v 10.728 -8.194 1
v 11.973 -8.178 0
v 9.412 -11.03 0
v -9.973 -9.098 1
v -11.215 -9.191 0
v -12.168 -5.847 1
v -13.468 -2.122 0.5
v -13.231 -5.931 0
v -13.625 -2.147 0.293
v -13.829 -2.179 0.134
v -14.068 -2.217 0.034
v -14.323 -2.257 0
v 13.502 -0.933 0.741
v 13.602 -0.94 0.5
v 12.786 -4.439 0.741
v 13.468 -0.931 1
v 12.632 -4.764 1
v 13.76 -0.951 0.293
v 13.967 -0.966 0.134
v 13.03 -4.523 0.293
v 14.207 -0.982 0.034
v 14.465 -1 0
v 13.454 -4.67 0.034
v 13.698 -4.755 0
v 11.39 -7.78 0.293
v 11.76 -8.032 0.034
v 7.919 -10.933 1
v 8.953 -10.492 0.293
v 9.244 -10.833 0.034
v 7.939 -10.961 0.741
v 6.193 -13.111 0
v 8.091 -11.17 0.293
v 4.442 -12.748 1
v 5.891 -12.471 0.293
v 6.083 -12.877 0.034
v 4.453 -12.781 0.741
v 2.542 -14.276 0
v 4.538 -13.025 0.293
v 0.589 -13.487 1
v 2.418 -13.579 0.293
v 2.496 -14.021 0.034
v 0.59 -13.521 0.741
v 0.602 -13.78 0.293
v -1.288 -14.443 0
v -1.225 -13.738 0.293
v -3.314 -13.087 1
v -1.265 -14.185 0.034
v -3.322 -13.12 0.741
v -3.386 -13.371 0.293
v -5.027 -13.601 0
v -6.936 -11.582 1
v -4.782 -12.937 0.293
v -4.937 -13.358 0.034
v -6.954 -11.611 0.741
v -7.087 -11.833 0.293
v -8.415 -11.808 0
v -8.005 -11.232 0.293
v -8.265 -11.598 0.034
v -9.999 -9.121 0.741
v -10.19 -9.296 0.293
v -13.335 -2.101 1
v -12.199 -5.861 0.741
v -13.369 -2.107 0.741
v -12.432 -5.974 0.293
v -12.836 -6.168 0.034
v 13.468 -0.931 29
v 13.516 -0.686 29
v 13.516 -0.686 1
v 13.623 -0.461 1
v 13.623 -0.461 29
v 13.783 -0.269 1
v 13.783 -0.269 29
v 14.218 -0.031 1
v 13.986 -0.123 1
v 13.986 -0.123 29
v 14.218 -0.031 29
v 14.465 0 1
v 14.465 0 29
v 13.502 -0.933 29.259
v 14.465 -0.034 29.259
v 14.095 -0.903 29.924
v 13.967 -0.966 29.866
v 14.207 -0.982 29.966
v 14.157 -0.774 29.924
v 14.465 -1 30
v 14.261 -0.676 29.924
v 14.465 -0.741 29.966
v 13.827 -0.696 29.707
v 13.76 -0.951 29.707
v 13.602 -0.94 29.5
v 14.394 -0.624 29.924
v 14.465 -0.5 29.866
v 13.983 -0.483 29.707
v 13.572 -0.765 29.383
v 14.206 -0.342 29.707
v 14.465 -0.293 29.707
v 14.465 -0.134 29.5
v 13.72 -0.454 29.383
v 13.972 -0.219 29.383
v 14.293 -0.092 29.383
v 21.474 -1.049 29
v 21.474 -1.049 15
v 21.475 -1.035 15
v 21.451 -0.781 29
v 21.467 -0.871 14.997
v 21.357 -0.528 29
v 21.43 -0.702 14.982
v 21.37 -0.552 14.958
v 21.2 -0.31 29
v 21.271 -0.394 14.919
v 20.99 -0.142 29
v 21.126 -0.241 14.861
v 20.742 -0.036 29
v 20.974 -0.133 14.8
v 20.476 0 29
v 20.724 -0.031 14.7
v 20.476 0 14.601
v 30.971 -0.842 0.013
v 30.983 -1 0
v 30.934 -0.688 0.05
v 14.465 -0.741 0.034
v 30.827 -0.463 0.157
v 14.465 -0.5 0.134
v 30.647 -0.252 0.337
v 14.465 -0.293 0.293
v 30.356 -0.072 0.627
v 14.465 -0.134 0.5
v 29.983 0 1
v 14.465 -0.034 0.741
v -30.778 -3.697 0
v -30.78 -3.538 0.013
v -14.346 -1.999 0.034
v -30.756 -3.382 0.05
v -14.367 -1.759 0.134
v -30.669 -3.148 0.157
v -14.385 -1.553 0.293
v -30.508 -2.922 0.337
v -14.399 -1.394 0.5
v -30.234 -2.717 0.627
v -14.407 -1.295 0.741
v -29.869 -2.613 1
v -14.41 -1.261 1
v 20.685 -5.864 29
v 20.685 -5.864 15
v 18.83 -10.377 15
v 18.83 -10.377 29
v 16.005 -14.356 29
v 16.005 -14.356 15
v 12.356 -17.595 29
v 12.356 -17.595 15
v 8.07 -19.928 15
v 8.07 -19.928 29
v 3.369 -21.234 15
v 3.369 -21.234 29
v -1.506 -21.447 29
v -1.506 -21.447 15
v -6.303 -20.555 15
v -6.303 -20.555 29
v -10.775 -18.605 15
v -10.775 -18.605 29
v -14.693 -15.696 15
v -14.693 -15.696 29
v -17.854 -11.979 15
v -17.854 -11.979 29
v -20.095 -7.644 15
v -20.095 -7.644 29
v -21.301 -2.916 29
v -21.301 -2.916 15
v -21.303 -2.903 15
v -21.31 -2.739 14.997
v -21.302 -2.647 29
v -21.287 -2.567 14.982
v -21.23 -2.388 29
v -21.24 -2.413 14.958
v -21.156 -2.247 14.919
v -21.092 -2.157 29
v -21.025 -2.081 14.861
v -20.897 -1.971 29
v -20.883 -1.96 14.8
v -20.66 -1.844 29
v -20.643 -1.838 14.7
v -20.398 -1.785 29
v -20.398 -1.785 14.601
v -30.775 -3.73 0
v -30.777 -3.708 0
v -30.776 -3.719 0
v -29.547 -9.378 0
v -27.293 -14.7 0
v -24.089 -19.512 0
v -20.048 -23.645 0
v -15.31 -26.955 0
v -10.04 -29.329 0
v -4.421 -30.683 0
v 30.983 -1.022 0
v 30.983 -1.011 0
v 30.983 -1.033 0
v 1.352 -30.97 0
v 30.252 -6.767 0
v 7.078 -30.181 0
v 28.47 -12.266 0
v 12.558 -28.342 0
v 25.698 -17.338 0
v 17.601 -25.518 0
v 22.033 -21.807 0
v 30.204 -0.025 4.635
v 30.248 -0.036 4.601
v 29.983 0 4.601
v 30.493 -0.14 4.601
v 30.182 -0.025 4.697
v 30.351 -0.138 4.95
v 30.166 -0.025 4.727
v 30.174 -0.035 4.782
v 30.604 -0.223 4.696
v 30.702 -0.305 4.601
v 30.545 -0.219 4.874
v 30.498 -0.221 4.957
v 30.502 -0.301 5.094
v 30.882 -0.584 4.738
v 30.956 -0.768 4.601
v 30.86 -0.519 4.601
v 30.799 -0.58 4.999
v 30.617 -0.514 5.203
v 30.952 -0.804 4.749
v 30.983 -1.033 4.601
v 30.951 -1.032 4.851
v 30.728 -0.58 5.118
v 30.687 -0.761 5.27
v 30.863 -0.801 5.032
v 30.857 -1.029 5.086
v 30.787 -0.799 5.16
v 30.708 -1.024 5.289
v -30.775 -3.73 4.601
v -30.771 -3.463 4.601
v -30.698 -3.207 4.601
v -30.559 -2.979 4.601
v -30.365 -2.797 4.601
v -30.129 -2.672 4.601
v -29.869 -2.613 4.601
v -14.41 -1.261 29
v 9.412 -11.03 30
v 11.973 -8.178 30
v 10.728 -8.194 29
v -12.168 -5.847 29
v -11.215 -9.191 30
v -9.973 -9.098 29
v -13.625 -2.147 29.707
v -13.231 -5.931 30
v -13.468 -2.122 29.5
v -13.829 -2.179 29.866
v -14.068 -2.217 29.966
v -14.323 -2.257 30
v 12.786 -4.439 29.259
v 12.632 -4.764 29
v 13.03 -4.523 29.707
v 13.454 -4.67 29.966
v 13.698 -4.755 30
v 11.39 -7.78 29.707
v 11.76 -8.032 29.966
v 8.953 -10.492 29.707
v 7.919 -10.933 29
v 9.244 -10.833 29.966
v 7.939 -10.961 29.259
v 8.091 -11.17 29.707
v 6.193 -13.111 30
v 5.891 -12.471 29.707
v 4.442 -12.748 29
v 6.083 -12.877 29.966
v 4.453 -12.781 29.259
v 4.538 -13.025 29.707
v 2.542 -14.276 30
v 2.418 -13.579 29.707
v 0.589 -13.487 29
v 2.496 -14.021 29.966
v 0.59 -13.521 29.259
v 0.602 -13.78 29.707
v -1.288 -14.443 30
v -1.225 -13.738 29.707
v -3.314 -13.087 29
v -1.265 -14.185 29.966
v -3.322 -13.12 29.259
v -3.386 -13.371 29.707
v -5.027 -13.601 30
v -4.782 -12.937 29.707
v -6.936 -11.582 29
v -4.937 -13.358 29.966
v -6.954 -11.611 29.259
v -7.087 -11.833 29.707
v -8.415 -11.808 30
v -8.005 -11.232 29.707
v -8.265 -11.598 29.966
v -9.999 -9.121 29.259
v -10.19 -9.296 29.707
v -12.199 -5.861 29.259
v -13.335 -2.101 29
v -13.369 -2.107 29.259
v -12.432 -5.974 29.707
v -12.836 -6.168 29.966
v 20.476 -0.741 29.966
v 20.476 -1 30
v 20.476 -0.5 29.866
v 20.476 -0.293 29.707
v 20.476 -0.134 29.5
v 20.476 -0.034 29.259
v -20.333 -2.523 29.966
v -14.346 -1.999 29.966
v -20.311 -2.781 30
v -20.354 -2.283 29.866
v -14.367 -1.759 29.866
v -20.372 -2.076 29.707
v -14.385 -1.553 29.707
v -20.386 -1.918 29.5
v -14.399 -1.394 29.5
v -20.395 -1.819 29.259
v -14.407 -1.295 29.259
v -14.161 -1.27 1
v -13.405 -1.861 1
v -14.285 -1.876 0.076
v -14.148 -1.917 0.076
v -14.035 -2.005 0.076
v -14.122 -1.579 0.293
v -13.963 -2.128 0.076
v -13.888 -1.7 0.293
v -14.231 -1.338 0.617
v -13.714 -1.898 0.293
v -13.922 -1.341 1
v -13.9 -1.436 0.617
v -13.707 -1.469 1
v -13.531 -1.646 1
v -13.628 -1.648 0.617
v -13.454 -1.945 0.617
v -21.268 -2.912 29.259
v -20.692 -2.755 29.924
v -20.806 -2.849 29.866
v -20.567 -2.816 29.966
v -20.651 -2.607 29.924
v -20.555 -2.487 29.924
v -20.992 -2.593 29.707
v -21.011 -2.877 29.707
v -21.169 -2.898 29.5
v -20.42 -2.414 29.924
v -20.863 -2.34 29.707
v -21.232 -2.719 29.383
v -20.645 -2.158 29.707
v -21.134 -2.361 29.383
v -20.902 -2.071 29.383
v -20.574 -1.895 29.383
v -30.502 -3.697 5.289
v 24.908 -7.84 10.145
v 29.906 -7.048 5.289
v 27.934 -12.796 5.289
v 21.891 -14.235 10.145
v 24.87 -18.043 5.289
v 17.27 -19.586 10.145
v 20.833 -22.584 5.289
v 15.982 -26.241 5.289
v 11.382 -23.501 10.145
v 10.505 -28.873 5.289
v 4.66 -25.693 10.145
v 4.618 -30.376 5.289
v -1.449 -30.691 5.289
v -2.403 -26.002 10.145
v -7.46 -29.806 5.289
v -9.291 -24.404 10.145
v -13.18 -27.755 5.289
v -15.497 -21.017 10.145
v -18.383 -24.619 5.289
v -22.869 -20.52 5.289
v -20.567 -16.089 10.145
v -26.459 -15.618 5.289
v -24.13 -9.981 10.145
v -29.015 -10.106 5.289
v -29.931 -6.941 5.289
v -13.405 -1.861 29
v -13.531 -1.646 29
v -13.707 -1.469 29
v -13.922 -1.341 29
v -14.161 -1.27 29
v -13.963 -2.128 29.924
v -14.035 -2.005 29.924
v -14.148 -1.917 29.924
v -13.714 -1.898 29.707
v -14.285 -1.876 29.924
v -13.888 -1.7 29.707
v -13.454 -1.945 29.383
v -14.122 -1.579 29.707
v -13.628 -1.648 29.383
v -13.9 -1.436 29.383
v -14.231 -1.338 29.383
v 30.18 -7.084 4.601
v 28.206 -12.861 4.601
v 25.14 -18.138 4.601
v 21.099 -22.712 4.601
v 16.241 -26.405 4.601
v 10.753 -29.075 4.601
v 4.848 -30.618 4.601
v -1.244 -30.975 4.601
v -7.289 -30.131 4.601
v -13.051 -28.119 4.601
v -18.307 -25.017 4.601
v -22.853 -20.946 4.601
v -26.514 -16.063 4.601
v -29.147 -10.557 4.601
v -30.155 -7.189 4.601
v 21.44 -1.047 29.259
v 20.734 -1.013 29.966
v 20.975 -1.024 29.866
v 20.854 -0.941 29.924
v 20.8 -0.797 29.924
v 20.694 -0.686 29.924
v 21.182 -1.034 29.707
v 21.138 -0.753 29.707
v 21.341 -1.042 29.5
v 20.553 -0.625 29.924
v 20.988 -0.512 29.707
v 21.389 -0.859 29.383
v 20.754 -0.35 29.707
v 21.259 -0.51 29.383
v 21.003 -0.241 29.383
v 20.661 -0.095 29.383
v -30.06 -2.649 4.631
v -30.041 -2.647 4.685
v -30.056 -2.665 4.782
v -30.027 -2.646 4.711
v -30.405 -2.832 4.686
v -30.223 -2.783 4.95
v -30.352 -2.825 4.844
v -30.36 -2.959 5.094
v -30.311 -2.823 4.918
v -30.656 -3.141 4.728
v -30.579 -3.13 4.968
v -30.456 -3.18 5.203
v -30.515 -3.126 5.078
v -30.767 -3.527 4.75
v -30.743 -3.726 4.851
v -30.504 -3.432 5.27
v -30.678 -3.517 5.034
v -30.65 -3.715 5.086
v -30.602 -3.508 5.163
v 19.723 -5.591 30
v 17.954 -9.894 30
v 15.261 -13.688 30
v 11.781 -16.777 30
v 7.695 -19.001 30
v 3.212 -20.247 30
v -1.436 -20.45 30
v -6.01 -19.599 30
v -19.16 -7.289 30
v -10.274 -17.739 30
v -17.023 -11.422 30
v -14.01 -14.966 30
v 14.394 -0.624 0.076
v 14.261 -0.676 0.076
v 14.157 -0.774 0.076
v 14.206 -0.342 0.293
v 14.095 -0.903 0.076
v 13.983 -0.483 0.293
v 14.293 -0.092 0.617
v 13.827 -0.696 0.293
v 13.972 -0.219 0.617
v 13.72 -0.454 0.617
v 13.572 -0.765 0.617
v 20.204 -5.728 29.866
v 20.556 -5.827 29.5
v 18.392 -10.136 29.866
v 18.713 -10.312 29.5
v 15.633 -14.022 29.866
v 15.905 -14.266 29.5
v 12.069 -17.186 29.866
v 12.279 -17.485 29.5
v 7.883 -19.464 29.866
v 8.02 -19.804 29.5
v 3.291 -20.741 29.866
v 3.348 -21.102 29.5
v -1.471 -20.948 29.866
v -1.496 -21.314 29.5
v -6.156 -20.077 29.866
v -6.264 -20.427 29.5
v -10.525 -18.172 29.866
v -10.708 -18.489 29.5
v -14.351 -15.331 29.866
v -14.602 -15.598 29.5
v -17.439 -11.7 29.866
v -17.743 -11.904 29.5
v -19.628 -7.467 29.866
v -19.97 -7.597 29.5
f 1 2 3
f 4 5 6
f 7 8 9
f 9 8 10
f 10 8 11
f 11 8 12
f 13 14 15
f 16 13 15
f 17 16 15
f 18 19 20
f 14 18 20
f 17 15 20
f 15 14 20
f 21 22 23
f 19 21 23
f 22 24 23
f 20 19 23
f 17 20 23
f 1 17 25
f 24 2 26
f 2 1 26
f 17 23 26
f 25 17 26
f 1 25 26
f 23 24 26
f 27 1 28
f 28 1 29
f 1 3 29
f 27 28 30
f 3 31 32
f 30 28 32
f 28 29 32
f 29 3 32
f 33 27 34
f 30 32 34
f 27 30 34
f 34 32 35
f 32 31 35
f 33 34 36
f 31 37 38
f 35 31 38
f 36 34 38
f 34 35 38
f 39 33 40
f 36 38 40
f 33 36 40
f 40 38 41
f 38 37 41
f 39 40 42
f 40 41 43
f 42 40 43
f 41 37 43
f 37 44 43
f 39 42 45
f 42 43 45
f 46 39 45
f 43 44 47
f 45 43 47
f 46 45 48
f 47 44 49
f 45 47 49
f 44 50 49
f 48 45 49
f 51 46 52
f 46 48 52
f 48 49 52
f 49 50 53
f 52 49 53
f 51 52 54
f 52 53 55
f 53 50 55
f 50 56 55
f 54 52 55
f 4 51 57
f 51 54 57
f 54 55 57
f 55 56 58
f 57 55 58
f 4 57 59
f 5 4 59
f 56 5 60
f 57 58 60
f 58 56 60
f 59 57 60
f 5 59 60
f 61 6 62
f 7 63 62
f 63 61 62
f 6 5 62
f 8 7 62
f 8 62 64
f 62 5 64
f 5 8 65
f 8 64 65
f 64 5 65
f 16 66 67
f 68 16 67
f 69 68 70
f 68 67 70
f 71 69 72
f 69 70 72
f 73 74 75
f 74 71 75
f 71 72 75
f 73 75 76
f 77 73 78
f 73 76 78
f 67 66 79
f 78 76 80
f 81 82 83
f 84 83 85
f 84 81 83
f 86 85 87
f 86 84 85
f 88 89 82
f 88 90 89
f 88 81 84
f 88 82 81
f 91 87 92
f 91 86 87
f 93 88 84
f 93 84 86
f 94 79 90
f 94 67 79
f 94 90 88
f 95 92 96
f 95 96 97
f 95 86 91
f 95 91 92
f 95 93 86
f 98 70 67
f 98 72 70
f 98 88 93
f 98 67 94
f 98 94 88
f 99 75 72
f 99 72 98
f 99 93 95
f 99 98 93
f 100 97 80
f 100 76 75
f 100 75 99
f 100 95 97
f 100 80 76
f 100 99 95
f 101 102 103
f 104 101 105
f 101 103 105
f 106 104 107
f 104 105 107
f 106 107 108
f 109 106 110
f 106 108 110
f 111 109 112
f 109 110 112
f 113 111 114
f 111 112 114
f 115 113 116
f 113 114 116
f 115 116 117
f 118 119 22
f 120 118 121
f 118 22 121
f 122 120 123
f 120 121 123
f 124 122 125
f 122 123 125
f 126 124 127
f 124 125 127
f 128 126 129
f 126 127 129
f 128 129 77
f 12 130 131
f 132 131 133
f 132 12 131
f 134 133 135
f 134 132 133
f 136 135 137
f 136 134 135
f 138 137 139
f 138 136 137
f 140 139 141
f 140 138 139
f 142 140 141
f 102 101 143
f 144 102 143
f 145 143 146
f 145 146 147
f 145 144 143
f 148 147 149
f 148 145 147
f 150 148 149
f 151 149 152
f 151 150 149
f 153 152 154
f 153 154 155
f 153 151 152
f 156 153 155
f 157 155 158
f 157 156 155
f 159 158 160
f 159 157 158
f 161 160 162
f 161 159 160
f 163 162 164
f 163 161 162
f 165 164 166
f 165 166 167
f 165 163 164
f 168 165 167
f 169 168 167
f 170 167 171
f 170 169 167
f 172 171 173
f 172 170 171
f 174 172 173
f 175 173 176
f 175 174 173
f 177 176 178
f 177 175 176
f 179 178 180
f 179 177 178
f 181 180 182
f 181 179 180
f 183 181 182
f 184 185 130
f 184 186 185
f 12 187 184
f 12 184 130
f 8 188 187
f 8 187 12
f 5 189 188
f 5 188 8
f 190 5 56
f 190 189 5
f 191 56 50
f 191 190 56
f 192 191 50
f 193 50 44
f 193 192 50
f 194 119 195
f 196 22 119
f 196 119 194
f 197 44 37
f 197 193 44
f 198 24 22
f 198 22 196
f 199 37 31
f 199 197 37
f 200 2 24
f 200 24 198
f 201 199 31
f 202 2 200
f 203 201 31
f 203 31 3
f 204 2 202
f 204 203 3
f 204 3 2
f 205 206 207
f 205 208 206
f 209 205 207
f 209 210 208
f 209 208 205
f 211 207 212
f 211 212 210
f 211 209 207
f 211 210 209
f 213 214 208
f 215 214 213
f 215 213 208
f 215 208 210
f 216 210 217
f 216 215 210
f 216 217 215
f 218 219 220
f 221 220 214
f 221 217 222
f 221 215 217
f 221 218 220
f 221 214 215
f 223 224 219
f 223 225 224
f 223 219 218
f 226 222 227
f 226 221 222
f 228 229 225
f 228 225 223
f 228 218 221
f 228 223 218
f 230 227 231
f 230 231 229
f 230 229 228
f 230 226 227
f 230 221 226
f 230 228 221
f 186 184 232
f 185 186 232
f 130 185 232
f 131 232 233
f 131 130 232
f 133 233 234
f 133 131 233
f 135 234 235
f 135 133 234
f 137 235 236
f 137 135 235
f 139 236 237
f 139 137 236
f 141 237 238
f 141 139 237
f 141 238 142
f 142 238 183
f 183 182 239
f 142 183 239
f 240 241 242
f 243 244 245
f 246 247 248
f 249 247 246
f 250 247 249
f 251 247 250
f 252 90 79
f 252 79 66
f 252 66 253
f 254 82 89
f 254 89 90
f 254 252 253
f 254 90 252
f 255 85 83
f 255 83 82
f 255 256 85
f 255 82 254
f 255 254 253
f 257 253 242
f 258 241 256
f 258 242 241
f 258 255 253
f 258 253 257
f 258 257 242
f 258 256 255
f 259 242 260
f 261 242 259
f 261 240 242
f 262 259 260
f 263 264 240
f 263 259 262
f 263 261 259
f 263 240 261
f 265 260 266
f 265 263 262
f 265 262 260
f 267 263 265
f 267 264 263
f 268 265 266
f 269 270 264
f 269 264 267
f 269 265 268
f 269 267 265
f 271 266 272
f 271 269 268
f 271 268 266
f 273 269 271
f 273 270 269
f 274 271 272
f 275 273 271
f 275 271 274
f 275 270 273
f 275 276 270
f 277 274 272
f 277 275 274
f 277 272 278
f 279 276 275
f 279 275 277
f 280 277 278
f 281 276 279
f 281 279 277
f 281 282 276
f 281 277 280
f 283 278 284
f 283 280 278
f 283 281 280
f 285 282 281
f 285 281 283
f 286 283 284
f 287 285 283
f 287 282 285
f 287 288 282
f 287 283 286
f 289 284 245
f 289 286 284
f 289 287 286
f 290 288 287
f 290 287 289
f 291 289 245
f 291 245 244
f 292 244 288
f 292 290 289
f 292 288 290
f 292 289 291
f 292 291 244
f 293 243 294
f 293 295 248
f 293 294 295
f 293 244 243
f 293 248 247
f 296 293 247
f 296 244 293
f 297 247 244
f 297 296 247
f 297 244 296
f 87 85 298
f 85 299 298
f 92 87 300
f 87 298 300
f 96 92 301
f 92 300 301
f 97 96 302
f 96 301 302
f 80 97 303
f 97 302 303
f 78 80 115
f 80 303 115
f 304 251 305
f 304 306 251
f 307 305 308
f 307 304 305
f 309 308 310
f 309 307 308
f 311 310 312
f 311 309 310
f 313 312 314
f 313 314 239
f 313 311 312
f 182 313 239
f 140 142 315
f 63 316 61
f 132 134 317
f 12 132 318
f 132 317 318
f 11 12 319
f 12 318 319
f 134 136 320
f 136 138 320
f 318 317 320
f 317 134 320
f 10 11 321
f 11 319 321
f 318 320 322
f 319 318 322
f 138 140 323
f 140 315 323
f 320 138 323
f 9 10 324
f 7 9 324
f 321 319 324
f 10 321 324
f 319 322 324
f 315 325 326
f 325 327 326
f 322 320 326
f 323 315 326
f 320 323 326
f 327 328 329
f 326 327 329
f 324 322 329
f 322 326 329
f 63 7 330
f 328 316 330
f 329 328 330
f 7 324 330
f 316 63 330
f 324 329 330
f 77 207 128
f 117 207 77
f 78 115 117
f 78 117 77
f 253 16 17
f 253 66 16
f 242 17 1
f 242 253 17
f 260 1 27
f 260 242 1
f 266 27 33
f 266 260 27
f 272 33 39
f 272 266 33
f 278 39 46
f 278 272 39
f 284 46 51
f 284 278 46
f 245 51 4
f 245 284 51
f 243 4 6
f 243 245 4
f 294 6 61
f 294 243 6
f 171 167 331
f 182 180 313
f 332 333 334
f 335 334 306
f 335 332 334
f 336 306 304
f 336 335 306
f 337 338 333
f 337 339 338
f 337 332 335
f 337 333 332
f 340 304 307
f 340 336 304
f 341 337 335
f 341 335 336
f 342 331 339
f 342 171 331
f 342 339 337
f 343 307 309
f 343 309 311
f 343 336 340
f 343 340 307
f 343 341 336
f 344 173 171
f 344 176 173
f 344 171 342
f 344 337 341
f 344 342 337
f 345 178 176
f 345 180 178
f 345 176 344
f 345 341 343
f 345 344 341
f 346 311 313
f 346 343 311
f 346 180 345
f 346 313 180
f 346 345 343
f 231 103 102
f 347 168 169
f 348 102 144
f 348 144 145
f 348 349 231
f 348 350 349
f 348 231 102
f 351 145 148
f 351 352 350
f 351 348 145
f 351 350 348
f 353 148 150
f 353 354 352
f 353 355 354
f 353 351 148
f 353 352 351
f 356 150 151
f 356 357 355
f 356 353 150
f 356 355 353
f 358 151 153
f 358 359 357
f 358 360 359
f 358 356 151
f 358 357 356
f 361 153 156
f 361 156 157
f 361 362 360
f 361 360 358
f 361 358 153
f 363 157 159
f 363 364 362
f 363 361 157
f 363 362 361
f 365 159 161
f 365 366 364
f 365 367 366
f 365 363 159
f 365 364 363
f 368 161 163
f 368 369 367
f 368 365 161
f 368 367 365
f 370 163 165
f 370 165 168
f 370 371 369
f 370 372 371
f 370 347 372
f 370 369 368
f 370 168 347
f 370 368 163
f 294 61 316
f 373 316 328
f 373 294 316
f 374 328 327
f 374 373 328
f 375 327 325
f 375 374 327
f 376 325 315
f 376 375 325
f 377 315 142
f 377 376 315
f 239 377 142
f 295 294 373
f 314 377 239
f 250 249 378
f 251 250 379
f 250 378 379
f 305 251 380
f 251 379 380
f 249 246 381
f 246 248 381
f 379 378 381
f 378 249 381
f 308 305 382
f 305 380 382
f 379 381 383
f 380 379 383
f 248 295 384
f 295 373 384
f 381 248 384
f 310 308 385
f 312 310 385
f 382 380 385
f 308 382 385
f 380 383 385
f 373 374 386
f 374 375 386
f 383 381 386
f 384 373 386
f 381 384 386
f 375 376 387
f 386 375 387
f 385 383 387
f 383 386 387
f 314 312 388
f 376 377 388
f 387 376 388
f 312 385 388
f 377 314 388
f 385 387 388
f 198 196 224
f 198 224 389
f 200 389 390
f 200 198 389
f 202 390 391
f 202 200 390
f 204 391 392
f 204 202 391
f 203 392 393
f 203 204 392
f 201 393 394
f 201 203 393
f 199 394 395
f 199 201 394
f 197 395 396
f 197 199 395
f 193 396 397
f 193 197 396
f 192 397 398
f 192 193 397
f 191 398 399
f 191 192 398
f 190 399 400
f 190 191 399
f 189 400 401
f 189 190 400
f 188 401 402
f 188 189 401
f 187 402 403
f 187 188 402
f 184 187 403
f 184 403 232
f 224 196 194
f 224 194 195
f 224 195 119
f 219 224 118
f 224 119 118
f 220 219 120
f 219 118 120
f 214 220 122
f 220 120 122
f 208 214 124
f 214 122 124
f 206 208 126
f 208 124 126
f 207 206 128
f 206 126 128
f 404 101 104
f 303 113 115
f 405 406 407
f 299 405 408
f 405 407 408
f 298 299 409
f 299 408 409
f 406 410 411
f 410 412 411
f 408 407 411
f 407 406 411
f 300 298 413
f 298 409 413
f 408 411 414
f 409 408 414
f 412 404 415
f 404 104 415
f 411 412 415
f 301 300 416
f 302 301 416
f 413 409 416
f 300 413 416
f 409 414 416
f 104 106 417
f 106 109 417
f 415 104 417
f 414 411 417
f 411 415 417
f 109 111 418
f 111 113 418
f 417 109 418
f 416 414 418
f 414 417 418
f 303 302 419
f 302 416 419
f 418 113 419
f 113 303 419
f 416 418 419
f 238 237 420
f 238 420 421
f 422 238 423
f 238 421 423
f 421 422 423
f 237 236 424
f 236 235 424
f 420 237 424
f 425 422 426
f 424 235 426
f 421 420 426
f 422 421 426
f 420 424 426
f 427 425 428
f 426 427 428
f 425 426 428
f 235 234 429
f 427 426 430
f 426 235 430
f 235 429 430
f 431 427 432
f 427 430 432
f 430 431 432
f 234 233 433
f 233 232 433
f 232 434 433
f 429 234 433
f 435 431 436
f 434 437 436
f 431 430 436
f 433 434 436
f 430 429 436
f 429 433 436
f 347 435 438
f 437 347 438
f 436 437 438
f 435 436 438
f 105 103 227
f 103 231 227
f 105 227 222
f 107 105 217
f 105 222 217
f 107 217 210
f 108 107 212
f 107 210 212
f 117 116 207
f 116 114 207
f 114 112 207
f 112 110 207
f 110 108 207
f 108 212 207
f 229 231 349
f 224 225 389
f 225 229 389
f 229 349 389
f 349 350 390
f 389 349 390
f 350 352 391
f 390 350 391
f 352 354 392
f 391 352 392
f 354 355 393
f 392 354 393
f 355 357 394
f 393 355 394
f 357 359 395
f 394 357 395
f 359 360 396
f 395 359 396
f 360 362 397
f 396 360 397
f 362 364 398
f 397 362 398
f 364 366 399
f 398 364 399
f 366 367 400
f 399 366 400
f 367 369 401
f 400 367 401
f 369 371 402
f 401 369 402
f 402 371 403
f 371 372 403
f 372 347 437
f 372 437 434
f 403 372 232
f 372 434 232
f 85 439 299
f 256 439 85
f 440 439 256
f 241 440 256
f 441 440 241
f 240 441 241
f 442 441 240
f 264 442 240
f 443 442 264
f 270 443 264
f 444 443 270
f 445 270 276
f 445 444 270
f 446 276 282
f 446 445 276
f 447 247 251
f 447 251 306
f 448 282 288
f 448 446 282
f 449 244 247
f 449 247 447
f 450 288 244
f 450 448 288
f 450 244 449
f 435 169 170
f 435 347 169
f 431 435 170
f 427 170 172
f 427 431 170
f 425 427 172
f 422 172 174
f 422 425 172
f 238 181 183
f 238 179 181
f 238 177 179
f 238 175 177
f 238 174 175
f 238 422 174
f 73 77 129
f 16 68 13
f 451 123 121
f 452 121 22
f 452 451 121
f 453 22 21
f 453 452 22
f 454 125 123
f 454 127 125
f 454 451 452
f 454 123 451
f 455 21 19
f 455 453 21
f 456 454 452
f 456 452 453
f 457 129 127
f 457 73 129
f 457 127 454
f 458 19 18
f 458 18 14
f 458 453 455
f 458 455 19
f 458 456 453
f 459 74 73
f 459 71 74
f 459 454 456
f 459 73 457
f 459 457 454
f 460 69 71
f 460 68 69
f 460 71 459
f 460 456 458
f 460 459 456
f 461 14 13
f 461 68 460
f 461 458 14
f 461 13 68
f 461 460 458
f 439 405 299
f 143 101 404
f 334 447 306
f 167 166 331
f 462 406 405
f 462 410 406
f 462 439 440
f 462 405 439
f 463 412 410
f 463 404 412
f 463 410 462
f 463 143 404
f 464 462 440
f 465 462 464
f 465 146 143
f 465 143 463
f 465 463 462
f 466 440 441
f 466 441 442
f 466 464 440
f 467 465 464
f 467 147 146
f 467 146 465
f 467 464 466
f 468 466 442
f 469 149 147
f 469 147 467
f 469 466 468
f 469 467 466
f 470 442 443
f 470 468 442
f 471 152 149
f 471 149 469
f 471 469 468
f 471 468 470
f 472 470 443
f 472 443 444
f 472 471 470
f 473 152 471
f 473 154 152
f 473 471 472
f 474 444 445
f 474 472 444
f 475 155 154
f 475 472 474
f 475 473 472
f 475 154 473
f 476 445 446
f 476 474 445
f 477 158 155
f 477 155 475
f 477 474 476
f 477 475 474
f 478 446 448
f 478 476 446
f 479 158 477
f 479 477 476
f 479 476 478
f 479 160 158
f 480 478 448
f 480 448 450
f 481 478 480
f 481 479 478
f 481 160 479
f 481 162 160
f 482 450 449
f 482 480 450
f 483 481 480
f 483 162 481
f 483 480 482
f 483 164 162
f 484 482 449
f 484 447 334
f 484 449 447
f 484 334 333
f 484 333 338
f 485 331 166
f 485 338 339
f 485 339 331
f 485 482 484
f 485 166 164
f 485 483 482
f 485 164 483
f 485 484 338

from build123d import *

# Parameters (mm, degrees)
REVOLUTION_ANGLE = -175
FILLET_R         = 1


with BuildPart() as part:
    # Sketch → Revolution (revolve)
    with BuildSketch(Plane.XZ):
        Polygon((13.5, 0), (13.5, 30), (21.5, 30), (21.5, 15), (31, 5), (31, 0), align=None)
    revolve(axis=Axis((0, 0, 0), (0, 0, 1)), revolution_arc=REVOLUTION_ANGLE)

    # Fillet
    fillet_edges = [part.edges().sort_by_distance(p)[0] for p in [
        (0.588862, -13.487151, 0),
        (-13.448628, -1.176603, 15),
        (13.5, 0, 15),
        (0.588862, -13.487151, 30),
        (0.937817, -21.479537, 30),
        (1.352201, -30.970495, 5),
        (22.25, 0, 0),
        (-22.165332, -1.939215, 0),
        (17.5, 0, 30),
        (-17.433407, -1.525225, 30),
        (31, 0, 2.5),
        (26.25, 0, 10),
        (21.5, 0, 22.5),
        (-30.882036, -2.701828, 2.5),
        (-26.150111, -2.287838, 10),
        (-21.418186, -1.873848, 22.5),
    ]]
    fillet(fillet_edges, radius=FILLET_R)


solid = part.part
